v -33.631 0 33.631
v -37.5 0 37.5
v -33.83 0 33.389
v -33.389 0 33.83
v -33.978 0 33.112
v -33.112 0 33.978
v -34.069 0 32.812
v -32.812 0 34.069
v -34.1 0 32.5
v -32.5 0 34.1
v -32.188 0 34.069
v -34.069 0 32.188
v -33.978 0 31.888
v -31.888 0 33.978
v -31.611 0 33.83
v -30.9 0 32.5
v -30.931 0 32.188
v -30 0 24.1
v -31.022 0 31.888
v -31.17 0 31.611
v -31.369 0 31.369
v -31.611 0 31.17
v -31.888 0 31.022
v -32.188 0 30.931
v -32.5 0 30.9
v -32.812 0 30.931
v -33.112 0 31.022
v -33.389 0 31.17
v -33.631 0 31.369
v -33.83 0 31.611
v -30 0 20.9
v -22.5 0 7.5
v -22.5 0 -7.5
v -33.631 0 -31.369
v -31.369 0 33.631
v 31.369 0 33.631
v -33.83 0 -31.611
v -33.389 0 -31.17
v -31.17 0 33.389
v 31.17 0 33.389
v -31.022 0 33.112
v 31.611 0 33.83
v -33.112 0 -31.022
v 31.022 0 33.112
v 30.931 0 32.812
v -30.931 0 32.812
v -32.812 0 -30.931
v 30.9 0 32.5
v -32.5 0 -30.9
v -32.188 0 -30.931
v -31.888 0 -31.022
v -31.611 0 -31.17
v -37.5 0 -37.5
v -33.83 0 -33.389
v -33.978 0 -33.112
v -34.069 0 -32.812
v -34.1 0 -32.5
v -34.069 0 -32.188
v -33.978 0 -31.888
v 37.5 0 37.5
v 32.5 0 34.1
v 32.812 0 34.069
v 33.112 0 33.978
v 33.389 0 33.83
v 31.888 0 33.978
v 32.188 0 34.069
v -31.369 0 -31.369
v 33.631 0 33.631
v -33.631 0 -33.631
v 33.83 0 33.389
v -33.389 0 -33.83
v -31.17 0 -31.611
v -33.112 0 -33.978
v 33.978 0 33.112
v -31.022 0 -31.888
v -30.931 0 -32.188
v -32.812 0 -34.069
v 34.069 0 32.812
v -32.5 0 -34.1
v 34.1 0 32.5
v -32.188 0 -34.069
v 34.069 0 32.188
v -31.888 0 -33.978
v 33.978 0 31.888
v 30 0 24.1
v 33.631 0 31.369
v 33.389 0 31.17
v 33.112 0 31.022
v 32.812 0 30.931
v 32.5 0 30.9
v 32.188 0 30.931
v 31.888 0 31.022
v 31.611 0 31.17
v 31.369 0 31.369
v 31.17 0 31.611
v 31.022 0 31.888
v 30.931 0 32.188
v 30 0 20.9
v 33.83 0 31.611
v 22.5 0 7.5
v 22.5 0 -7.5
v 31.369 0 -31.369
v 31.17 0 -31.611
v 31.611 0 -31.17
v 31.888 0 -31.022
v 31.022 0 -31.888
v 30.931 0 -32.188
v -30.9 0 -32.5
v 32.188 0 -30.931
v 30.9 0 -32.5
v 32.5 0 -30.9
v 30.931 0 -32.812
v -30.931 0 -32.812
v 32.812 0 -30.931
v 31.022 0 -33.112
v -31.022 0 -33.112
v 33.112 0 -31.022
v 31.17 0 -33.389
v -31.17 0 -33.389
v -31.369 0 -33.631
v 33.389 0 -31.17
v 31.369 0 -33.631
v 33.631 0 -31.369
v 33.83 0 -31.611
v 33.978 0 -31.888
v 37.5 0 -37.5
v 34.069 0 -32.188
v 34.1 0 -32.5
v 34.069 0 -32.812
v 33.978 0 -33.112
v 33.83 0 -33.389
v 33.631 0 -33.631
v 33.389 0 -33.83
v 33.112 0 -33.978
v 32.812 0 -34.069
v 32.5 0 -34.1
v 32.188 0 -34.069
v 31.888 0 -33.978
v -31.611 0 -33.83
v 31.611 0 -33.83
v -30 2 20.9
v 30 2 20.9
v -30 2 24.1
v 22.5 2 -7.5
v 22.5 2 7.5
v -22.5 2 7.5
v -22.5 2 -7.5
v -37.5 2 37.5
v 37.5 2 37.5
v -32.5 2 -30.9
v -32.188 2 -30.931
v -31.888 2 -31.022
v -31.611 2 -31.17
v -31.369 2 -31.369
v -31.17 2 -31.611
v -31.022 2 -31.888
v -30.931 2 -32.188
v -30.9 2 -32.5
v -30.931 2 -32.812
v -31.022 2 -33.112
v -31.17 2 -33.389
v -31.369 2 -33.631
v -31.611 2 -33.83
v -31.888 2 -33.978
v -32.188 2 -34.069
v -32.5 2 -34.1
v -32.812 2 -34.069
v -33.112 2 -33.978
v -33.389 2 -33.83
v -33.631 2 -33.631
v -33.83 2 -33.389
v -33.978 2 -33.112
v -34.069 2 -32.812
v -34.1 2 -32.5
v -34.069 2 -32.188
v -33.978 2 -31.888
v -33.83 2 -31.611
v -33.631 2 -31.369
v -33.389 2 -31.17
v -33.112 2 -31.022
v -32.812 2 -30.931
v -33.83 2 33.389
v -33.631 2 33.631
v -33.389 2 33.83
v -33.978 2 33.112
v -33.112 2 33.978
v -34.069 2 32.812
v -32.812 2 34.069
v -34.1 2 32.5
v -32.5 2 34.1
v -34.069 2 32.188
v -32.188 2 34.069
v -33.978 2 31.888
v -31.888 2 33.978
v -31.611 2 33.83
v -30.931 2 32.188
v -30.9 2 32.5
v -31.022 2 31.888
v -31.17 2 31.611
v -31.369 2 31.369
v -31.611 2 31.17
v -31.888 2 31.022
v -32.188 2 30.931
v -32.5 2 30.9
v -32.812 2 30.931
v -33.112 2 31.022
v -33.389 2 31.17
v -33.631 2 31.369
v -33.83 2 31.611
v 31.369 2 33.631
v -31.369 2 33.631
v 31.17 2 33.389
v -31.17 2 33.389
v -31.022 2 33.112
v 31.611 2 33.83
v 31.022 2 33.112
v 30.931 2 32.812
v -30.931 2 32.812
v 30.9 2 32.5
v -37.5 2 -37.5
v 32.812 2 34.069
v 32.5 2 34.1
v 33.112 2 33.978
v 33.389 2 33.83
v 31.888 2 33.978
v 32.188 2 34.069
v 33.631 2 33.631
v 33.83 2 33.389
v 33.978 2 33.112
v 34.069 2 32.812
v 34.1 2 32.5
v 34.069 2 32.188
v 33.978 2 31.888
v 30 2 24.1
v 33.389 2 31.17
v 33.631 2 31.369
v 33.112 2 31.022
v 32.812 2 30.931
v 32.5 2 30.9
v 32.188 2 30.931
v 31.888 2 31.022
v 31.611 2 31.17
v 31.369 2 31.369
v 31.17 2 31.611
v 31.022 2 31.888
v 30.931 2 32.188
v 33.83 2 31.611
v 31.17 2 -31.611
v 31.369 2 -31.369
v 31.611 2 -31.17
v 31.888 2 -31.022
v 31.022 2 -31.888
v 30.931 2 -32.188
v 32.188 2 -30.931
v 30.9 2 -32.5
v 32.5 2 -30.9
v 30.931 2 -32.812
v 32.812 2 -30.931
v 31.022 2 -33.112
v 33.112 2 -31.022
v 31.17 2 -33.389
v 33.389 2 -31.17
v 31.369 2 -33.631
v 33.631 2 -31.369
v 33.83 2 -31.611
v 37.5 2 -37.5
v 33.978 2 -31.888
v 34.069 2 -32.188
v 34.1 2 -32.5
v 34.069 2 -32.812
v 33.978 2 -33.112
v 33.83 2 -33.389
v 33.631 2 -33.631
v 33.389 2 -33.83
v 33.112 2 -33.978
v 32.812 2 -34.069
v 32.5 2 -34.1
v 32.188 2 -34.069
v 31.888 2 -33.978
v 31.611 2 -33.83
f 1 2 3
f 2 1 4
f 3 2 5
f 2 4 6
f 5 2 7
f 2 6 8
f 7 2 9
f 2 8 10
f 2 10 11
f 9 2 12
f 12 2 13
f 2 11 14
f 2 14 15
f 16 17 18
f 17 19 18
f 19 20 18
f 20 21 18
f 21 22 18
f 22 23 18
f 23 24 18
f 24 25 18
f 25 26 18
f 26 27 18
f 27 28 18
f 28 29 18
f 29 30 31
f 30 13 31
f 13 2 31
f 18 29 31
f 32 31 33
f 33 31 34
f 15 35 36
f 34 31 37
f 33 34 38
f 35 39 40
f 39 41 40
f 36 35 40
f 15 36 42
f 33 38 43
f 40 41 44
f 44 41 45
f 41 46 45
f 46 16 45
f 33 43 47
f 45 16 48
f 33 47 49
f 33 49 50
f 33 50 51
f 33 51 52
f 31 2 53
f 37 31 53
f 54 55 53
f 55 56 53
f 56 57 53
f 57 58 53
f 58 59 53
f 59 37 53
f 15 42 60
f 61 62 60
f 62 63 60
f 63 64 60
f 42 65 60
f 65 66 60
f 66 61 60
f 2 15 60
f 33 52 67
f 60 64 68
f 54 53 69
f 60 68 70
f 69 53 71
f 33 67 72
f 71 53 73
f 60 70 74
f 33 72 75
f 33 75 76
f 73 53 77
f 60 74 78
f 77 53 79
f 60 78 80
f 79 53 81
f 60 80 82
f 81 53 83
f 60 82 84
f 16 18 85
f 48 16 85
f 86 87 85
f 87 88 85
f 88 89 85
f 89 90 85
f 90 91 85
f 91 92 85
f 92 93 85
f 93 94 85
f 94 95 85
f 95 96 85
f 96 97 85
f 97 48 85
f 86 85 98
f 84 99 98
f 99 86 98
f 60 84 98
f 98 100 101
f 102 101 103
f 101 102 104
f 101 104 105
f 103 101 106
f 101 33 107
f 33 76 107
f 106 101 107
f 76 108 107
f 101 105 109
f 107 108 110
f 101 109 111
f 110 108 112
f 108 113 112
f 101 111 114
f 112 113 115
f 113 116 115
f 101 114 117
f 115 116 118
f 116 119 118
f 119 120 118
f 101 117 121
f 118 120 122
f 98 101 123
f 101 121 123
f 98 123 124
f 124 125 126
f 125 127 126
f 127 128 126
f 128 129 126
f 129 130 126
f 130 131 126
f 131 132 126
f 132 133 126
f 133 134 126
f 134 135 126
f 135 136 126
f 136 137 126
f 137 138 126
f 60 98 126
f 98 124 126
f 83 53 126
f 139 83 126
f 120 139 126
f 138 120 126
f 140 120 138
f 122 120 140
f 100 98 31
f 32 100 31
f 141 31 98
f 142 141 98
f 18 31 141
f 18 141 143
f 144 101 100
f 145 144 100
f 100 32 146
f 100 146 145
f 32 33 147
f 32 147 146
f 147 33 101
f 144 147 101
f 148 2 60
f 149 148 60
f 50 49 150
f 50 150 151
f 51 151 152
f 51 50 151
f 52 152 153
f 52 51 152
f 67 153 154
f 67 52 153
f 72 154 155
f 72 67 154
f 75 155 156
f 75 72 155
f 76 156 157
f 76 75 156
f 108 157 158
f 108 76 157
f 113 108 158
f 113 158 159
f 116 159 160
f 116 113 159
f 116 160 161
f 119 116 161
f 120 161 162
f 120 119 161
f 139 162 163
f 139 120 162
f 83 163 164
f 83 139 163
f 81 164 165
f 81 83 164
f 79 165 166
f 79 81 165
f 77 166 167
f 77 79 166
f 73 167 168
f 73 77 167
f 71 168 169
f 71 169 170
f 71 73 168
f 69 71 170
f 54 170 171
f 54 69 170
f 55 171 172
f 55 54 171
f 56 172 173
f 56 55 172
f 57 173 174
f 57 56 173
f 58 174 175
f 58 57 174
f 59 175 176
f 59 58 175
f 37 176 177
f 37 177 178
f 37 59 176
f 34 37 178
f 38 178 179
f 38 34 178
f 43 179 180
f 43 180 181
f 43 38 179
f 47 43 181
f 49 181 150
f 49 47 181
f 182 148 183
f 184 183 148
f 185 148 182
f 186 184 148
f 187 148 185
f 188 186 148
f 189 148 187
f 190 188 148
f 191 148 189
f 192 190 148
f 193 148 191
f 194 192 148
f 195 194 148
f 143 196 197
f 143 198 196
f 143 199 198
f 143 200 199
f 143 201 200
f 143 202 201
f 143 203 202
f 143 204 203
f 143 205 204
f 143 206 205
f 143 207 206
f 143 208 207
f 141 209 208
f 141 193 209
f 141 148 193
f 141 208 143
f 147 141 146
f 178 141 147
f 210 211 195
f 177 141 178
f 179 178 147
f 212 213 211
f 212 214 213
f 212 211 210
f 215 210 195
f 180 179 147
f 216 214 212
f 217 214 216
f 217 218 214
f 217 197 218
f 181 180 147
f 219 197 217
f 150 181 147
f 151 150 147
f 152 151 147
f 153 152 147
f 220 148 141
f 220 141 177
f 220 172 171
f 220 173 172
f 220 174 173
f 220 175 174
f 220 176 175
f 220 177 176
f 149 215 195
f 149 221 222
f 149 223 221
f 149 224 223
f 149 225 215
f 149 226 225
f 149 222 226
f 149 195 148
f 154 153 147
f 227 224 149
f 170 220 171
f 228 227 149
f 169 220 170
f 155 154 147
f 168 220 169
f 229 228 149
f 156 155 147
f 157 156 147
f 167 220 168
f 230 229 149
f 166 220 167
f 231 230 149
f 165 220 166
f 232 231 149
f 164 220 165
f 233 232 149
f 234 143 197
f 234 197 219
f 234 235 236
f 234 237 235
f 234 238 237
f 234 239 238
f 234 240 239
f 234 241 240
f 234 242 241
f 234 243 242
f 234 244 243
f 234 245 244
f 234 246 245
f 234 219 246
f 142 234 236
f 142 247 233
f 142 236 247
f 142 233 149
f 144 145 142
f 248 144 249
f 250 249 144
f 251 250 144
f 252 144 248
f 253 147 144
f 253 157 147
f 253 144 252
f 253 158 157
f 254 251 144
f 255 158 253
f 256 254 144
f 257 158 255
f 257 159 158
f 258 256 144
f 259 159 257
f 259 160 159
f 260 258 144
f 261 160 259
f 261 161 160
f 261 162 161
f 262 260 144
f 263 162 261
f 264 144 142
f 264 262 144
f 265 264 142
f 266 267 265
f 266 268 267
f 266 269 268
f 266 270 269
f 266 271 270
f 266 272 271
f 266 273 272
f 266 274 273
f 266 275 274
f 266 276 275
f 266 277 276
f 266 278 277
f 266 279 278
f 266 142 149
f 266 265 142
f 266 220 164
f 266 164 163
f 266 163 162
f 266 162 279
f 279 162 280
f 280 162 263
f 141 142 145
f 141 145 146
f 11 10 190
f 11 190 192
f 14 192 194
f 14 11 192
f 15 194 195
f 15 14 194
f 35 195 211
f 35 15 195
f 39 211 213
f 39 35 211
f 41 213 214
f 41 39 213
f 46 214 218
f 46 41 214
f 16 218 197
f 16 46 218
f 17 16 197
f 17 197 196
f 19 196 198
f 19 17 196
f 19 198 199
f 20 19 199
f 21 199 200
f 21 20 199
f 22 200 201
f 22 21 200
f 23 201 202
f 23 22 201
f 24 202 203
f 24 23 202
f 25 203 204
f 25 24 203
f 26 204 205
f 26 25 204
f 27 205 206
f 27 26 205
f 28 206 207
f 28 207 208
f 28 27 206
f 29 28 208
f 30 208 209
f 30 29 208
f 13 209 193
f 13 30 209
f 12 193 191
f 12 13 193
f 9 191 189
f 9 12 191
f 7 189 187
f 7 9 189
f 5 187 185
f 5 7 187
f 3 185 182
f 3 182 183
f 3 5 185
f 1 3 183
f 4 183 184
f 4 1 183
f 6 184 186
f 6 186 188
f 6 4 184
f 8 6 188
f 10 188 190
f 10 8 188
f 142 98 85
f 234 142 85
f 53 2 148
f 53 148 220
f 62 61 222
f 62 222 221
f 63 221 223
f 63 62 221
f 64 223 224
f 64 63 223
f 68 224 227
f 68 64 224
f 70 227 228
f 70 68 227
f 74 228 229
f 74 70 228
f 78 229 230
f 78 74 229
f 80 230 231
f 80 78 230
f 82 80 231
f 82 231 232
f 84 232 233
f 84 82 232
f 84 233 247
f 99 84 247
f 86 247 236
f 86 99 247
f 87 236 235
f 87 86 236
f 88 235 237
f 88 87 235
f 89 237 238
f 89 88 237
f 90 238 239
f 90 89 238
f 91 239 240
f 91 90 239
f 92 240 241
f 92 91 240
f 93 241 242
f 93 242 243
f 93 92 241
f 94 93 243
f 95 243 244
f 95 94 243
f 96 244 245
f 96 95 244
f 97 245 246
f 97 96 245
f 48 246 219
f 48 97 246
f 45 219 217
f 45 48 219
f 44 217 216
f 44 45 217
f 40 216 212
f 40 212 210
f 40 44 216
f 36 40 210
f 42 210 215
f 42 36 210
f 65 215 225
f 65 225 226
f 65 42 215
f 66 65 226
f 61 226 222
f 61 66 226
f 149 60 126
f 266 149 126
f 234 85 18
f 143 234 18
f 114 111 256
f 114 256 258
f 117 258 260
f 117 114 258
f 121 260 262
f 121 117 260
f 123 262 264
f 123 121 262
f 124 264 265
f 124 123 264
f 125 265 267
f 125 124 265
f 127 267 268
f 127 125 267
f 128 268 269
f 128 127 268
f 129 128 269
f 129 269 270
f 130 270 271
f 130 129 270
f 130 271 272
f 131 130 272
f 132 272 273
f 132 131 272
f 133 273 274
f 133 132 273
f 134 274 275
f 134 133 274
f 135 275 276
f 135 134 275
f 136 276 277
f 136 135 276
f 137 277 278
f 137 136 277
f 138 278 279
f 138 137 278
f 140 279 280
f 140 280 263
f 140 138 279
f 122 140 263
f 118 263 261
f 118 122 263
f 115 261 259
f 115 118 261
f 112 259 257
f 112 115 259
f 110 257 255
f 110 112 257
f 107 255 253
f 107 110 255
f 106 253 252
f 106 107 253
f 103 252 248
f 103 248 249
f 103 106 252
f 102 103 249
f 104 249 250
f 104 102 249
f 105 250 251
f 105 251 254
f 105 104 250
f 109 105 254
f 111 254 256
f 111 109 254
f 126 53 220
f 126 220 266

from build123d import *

# Parameters (mm, degrees)
SKETCH1_W           = 75
SKETCH1_H           = 75
SKETCH1_R           = 1.6
BOSS_EXTRUDE1_DEPTH = 2
SKETCH2_W           = 45
SKETCH2_H           = 15
CUT_EXTRUDE1_DEPTH  = 10
SKETCH3_W           = 30
SKETCH3_H           = 3.2
CUT_EXTRUDE2_DEPTH  = 10


with BuildPart() as part:
    # Sketch1 → Boss-Extrude1 (new body)
    with BuildSketch(Plane(origin=(0, 0, 0), x_dir=(1, 0, 0), z_dir=(0, 1, 0))):
        Rectangle(SKETCH1_W, SKETCH1_H)
        with Locations(Location((-32.5, 32.5, 0), (0, 0, 270))):
            Circle(SKETCH1_R, mode=Mode.SUBTRACT)
        with Locations(Location((-32.5, -32.5, 0), (0, 0, 270))):
            Circle(SKETCH1_R, mode=Mode.SUBTRACT)
        with Locations(Location((32.5, 32.5, 0), (0, 0, 270))):
            Circle(SKETCH1_R, mode=Mode.SUBTRACT)
        with Locations(Location((32.5, -32.5, 0), (0, 0, 270))):
            Circle(SKETCH1_R, mode=Mode.SUBTRACT)
    extrude(amount=BOSS_EXTRUDE1_DEPTH)

    # Sketch2 → Cut-Extrude1 (cut)
    with BuildSketch(Plane.XZ):
        Rectangle(SKETCH2_W, SKETCH2_H)
    extrude(amount=-CUT_EXTRUDE1_DEPTH, mode=Mode.SUBTRACT)

    # Sketch3 → Cut-Extrude2 (cut)
    with BuildSketch(Plane.XZ):
        with Locations((-15, 22.5)):
            Rectangle(SKETCH3_W, SKETCH3_H)
        with Locations((15, 22.5)):
            Rectangle(SKETCH3_W, SKETCH3_H)
    extrude(amount=-CUT_EXTRUDE2_DEPTH, mode=Mode.SUBTRACT)


solid = part.part
